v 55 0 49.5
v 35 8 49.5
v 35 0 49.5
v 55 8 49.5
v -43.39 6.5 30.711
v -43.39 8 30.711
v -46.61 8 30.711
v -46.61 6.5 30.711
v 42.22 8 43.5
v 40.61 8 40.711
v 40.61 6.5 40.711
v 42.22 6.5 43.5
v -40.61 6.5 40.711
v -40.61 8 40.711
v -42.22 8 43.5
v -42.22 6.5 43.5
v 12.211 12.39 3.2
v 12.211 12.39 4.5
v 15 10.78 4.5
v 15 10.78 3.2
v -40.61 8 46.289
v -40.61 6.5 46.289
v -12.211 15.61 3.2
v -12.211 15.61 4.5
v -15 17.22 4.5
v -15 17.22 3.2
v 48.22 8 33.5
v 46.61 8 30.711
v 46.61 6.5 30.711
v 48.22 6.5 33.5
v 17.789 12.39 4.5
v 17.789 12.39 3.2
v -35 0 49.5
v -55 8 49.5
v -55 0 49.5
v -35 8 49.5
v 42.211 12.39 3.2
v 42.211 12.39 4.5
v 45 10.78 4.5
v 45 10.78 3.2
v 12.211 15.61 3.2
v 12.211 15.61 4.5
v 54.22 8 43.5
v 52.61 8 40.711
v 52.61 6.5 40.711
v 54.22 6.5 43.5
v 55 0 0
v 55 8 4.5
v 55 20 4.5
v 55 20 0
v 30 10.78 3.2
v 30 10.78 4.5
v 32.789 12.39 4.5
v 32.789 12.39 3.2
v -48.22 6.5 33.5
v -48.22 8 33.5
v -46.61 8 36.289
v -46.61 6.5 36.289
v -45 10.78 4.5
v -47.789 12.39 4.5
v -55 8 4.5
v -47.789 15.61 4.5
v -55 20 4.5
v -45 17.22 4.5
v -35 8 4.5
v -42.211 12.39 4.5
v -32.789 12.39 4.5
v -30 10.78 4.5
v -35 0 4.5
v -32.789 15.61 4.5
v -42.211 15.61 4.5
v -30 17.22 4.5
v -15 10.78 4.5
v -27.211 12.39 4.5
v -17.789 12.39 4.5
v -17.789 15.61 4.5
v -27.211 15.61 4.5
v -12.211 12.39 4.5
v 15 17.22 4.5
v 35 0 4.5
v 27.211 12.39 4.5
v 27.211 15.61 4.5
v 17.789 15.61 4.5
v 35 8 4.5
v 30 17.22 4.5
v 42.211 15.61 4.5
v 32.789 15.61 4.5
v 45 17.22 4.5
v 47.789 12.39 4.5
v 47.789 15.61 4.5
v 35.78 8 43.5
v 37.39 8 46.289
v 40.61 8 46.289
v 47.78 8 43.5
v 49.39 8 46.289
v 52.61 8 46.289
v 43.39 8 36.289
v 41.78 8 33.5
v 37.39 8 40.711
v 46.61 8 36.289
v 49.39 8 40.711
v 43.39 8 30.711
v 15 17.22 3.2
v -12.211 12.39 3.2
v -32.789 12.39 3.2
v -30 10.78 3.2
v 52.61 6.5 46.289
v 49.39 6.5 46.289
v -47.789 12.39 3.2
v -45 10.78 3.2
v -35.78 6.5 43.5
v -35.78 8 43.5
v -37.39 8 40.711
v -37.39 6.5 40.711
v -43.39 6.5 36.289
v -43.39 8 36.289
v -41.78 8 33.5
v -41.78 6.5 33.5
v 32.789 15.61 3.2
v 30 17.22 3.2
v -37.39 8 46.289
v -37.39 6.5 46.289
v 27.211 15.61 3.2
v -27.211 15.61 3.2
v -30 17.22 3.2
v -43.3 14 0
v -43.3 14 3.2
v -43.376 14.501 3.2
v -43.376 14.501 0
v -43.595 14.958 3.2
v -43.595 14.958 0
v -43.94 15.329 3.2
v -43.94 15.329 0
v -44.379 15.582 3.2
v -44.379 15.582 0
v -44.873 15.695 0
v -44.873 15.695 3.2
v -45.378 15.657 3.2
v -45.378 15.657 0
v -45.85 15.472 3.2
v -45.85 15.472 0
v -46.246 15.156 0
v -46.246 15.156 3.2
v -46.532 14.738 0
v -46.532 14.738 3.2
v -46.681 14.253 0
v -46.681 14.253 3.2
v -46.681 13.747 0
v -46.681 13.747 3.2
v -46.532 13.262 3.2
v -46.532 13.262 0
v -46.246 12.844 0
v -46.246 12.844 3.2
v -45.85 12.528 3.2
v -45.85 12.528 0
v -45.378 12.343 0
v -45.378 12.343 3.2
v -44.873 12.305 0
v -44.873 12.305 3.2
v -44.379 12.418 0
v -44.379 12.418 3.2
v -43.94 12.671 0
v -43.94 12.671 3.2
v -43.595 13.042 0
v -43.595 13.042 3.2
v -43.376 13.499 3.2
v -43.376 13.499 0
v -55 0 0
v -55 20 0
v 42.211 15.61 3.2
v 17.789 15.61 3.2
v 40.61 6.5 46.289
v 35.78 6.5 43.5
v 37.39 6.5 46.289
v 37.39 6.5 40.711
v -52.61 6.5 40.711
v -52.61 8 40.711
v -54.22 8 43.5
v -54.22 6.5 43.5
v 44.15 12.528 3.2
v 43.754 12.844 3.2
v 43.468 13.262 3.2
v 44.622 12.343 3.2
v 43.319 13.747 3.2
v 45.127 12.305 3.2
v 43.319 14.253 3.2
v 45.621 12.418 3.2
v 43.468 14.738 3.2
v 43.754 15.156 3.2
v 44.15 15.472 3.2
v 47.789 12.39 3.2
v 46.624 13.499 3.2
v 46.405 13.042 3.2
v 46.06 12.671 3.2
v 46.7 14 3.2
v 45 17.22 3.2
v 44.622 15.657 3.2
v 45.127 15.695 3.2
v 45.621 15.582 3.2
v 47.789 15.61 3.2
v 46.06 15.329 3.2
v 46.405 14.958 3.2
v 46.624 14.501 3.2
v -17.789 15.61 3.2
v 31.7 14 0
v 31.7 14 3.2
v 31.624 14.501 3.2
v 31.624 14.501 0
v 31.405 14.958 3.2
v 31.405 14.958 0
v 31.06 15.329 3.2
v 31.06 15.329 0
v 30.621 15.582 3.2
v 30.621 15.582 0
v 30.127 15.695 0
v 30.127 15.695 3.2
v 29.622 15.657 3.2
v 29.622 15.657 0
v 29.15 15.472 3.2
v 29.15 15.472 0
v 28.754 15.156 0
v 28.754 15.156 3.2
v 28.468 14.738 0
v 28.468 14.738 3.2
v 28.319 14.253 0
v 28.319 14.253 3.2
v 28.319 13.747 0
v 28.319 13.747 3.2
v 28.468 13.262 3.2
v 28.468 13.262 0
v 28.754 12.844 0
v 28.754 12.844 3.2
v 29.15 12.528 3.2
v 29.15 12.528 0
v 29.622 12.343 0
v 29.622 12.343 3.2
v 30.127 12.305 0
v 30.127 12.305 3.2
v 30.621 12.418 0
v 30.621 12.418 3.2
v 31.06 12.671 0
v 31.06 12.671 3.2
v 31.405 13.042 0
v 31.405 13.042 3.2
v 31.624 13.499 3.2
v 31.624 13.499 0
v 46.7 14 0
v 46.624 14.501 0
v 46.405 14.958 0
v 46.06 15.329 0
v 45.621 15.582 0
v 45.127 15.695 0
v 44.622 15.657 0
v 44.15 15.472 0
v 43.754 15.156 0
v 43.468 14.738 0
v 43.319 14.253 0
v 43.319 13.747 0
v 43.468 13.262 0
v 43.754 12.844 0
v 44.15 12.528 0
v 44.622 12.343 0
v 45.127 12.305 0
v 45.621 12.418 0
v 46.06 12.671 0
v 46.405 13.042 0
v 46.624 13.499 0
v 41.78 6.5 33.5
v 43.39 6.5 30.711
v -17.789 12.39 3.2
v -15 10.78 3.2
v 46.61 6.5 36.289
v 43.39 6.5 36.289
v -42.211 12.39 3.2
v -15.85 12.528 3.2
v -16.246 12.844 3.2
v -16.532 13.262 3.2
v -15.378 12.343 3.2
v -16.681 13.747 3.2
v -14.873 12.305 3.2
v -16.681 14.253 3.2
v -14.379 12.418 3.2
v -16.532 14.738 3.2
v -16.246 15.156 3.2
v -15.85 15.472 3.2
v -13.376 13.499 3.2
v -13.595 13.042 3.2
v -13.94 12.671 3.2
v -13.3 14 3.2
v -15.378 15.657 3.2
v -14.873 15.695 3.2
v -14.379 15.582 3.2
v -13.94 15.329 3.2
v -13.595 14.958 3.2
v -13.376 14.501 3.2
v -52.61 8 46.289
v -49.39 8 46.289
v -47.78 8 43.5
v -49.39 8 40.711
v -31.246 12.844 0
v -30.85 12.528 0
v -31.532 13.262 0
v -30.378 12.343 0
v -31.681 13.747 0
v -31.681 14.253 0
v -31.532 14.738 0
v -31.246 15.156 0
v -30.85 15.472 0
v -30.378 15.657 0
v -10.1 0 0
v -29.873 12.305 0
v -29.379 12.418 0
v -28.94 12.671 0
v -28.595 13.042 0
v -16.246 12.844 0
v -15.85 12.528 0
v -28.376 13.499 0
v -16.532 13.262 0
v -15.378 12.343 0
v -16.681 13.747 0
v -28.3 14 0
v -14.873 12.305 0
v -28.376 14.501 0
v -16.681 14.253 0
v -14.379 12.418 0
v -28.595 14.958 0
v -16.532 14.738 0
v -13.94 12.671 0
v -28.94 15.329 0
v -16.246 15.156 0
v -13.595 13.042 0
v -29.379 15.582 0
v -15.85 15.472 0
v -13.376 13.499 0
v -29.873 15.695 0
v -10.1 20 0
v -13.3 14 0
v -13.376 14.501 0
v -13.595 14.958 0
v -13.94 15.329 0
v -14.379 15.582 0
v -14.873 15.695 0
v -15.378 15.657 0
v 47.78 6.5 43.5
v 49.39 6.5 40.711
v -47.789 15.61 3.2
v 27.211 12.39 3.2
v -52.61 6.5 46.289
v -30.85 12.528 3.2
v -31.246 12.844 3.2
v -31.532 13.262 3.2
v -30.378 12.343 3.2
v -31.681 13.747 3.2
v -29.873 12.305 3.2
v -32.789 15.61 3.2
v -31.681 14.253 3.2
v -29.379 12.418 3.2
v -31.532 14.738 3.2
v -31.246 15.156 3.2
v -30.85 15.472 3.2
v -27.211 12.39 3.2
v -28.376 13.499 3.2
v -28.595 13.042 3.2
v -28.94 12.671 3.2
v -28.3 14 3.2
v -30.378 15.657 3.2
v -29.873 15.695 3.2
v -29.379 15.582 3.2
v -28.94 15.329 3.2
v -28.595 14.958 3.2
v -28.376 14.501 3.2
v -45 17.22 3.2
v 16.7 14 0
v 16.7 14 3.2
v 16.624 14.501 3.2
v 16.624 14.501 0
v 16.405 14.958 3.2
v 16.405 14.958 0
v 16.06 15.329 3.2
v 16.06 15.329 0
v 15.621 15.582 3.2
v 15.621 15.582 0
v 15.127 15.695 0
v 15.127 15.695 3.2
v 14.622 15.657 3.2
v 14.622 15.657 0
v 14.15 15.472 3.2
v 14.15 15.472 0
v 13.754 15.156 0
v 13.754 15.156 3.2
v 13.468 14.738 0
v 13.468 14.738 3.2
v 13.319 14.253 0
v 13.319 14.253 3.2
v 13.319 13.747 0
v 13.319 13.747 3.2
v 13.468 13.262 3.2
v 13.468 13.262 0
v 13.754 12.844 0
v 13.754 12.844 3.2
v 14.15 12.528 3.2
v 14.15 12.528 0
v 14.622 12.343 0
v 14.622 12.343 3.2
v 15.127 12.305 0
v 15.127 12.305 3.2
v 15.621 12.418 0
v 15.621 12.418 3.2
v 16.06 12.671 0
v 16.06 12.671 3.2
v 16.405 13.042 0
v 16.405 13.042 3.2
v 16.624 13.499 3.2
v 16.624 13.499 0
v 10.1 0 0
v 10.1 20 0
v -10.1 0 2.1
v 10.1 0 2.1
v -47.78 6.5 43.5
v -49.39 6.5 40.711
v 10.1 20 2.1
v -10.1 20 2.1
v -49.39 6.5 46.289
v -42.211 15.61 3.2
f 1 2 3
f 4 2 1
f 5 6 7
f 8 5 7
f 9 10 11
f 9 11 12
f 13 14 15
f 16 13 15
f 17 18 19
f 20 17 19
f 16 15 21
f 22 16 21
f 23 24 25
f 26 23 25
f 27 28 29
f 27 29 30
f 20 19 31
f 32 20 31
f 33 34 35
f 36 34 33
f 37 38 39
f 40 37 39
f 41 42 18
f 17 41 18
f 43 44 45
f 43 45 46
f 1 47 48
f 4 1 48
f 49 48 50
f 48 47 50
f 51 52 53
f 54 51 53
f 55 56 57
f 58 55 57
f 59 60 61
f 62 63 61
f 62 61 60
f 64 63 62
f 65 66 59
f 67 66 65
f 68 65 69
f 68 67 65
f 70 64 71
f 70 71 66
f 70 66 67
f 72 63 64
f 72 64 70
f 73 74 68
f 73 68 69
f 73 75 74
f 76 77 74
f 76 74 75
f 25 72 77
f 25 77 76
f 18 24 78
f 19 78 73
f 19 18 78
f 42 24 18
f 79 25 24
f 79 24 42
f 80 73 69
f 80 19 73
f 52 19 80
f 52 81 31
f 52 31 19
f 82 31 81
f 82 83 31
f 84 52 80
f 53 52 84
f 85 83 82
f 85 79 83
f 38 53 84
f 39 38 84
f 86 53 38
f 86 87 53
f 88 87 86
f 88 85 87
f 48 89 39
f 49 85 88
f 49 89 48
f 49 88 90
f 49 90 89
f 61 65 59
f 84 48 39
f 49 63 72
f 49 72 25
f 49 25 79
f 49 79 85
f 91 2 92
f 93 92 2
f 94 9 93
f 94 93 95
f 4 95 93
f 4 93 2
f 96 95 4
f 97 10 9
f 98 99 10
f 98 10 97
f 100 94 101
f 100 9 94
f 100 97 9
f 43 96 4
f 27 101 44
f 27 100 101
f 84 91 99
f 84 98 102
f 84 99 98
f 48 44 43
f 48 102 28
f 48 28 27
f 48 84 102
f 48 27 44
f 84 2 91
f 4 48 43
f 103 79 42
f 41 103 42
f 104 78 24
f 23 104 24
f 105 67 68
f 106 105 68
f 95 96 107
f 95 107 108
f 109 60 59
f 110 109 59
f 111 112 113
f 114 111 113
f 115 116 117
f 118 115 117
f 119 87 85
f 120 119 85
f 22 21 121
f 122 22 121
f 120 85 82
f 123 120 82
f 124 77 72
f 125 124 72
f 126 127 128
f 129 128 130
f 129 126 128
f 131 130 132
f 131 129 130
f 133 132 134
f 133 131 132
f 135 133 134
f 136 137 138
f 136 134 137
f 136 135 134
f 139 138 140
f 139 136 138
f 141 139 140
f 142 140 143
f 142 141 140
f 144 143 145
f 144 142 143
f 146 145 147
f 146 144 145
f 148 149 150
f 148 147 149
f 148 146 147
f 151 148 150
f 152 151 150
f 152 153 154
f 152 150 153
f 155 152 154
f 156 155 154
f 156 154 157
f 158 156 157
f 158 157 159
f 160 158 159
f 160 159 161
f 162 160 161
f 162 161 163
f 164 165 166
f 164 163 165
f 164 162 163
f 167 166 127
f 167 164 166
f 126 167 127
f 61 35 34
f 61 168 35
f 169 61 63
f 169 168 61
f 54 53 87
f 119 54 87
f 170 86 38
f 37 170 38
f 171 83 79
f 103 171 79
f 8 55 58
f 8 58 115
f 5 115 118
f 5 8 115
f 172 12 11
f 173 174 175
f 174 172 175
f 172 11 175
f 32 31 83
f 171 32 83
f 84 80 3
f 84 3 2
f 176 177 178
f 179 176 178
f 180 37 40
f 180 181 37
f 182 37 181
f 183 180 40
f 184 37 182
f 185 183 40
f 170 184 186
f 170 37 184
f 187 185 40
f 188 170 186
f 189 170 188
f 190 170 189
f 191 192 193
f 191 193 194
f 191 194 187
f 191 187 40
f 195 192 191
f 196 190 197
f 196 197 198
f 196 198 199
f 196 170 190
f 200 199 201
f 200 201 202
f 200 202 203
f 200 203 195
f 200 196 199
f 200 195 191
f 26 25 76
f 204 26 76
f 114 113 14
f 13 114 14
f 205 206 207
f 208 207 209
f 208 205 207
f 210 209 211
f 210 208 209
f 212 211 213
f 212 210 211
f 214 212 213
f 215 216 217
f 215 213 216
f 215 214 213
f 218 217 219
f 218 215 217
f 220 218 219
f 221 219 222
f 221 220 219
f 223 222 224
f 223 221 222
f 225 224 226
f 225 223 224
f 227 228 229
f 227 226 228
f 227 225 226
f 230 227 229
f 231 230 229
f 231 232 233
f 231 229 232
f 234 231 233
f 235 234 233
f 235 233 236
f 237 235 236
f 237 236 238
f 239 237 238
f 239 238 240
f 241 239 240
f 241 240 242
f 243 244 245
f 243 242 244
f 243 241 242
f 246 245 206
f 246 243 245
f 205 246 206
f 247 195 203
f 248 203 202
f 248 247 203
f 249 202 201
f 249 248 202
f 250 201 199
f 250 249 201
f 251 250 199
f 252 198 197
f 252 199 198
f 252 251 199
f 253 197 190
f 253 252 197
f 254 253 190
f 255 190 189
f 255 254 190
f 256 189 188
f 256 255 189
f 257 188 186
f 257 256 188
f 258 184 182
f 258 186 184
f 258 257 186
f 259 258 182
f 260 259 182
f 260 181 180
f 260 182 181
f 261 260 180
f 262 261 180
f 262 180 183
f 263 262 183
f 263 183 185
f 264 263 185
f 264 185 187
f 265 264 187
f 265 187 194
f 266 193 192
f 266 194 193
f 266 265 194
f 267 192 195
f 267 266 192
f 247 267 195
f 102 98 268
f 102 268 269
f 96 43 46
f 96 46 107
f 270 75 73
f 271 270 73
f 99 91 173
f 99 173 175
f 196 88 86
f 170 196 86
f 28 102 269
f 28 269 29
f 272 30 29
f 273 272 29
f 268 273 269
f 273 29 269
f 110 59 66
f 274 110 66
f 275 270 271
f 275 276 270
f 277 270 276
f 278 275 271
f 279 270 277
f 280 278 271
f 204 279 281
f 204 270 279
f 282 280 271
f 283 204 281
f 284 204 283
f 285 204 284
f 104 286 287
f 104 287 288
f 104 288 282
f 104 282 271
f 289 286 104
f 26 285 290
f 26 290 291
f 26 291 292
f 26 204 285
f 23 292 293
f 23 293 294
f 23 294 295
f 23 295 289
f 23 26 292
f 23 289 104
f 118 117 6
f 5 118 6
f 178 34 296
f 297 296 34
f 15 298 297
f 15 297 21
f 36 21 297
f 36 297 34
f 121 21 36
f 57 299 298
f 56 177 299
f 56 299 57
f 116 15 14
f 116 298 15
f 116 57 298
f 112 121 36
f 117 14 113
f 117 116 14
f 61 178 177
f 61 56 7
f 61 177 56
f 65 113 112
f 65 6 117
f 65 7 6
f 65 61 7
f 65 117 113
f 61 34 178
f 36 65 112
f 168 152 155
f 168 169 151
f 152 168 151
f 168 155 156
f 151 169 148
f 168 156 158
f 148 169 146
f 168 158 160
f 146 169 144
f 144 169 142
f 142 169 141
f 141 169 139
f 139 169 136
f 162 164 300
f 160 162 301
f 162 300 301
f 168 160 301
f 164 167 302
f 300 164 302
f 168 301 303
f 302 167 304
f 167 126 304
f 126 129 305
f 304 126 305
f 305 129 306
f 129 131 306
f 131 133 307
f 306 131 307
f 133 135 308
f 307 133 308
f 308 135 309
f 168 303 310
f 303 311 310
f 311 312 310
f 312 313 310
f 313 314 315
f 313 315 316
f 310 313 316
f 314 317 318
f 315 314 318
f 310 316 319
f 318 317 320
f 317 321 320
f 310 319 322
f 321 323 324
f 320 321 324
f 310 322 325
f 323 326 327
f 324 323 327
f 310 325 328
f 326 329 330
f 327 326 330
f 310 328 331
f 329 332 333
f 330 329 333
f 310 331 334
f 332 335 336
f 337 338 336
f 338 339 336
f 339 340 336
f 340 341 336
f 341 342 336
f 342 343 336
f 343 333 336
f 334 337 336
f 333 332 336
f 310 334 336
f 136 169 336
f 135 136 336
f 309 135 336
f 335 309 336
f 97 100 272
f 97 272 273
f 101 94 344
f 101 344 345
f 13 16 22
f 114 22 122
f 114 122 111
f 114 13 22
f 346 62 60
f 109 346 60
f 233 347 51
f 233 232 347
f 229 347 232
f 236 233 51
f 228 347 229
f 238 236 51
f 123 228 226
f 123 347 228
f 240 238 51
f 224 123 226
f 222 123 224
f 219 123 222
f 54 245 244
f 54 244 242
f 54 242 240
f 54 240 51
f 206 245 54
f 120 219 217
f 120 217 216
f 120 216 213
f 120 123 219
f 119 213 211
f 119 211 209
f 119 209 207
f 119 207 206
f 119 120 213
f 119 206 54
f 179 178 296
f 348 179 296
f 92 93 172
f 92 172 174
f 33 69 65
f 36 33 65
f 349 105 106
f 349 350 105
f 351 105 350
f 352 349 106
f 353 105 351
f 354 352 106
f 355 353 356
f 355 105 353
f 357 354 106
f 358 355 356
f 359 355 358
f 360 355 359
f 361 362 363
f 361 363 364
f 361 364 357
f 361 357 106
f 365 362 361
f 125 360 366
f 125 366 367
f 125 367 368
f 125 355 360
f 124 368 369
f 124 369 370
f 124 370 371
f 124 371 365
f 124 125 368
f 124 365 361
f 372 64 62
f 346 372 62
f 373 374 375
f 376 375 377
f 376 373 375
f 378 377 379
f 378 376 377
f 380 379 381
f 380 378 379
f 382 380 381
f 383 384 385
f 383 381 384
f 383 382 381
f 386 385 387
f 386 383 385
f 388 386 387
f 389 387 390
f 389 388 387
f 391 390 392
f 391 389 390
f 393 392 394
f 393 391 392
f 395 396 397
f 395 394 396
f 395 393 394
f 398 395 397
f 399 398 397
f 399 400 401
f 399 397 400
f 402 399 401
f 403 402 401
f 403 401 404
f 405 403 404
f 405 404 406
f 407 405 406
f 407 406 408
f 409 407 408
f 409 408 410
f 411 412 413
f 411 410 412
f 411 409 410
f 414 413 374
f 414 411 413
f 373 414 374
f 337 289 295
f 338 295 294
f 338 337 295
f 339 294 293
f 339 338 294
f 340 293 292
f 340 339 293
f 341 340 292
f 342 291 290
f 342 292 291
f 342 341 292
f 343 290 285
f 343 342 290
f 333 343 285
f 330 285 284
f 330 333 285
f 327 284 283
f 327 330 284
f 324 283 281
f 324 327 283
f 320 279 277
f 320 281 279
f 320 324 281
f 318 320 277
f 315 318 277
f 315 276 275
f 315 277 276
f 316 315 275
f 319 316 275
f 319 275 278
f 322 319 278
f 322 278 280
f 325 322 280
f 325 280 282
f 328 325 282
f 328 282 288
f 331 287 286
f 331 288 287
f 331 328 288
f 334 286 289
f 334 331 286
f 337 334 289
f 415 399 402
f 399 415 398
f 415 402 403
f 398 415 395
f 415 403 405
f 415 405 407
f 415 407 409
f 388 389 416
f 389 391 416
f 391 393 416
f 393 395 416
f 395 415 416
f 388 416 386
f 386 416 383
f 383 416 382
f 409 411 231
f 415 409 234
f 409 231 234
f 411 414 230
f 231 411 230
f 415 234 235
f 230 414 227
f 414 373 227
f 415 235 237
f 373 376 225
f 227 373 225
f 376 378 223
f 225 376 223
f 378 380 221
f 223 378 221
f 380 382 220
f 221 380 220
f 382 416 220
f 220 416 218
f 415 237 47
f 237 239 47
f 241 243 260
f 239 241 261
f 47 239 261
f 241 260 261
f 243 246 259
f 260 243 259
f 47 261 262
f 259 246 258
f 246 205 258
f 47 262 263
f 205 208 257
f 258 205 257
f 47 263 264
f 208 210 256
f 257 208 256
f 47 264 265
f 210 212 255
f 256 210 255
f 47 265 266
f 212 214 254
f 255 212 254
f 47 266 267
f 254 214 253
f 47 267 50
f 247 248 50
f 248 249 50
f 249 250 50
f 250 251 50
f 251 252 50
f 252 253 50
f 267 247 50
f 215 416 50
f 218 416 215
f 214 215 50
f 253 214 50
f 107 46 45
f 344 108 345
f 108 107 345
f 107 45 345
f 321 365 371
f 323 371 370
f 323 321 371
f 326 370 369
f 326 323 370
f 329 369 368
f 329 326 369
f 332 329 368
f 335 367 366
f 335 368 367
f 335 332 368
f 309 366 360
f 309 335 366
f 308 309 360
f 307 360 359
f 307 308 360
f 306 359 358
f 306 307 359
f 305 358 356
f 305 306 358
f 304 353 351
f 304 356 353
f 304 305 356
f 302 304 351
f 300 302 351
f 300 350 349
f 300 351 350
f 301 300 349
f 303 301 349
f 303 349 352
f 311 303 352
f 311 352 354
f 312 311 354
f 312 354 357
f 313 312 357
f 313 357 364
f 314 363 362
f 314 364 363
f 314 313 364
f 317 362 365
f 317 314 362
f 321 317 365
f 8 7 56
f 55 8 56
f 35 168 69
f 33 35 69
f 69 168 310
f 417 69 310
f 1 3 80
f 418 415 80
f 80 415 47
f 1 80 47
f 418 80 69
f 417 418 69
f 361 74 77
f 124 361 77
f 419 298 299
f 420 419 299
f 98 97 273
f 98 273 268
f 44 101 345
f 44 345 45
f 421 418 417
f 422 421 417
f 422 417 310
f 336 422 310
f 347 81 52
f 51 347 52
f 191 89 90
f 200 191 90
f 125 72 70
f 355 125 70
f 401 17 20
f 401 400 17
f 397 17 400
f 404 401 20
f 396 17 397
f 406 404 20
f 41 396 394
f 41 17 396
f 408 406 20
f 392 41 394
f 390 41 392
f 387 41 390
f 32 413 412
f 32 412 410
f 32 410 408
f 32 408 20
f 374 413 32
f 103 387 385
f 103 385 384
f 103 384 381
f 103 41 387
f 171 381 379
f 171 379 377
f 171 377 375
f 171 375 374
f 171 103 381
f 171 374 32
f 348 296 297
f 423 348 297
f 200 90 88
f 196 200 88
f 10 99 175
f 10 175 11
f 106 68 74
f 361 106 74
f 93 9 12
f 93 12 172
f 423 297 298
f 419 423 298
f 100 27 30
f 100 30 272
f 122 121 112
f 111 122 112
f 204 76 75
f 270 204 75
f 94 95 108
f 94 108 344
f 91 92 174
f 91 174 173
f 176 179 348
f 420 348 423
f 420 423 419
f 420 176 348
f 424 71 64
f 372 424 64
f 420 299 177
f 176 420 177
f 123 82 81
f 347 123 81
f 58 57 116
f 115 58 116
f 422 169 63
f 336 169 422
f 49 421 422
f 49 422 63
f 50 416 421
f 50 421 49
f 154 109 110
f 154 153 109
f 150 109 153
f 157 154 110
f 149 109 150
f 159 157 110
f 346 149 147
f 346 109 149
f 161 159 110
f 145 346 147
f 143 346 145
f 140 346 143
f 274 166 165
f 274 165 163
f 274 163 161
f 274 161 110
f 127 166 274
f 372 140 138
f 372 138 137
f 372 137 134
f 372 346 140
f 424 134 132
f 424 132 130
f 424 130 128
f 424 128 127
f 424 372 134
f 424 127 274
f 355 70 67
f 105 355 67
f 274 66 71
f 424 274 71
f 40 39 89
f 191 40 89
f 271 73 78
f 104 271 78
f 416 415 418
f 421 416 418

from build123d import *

# Parameters (mm, degrees)
SKETCH_1_W          = 110
SKETCH_1_H          = 20
SKETCH_1_R          = 1.7
EXTRUDE_1_DEPTH     = 4.5
SKETCH_2_W          = 20
SKETCH_2_H          = 8
EXTRUDE_2_DEPTH     = 45
CUT_EXTRUDE_1_DEPTH = 1.3
CUT_EXTRUDE_2_DEPTH = 29
SKETCH_11_R         = 1.7
CUT_EXTRUDE_3_DEPTH = 167
CUT_EXTRUDE_4_DEPTH = 1.5


with BuildPart() as part:
    # 草图1 → 凸台-拉伸1 (new body)
    with BuildSketch(Plane.XY):
        with Locations((0, 10)):
            Rectangle(SKETCH_1_W, SKETCH_1_H)
        with Locations((-45, 14)):
            Circle(SKETCH_1_R, mode=Mode.SUBTRACT)
        with Locations((-30, 14)):
            Circle(SKETCH_1_R, mode=Mode.SUBTRACT)
        with Locations((-15, 14)):
            Circle(SKETCH_1_R, mode=Mode.SUBTRACT)
        with Locations((15, 14)):
            Circle(SKETCH_1_R, mode=Mode.SUBTRACT)
        with Locations((30, 14)):
            Circle(SKETCH_1_R, mode=Mode.SUBTRACT)
        with Locations((45, 14)):
            Circle(SKETCH_1_R, mode=Mode.SUBTRACT)
    extrude(amount=EXTRUDE_1_DEPTH)

    # 草图2 → 凸台-拉伸2 (add)
    with BuildSketch(Plane.XY.offset(4.5)):
        with Locations((-45, 4)):
            Rectangle(SKETCH_2_W, SKETCH_2_H)
        with Locations((45, 4)):
            Rectangle(SKETCH_2_W, SKETCH_2_H)
    extrude(amount=EXTRUDE_2_DEPTH)

    # 草图3 → 切除-拉伸1 (cut)
    with BuildSketch(Plane.XY.offset(4.5)):
        Polygon((-45, 17.22), (-47.7886018, 15.61), (-47.7886018, 12.39), (-45, 10.78), (-42.2113982, 12.39), (-42.2113982, 15.61), align=None)
        Polygon((-30, 17.22), (-32.7886018, 15.61), (-32.7886018, 12.39), (-30, 10.78), (-27.2113982, 12.39), (-27.2113982, 15.61), align=None)
        Polygon((-15, 17.22), (-17.7886018, 15.61), (-17.7886018, 12.39), (-15, 10.78), (-12.2113982, 12.39), (-12.2113982, 15.61), align=None)
        Polygon((15, 17.22), (12.2113982, 15.61), (12.2113982, 12.39), (15, 10.78), (17.7886018, 12.39), (17.7886018, 15.61), align=None)
        Polygon((30, 17.22), (27.2113982, 15.61), (27.2113982, 12.39), (30, 10.78), (32.7886018, 12.39), (32.7886018, 15.61), align=None)
        Polygon((45, 17.22), (42.2113982, 15.61), (42.2113982, 12.39), (45, 10.78), (47.7886018, 12.39), (47.7886018, 15.61), align=None)
    extrude(amount=-CUT_EXTRUDE_1_DEPTH, mode=Mode.SUBTRACT)

    # 草图10 → 切除-拉伸2 (cut)
    with BuildSketch(Plane.XZ):
        Polygon((0, 0), (10.1, 0), (10.1, 2.1), (-10.1, 2.1), (-10.1, 0), align=None)
    extrude(amount=-CUT_EXTRUDE_2_DEPTH, mode=Mode.SUBTRACT)

    # 草图11 → 切除-拉伸3 (cut)
    with BuildSketch(Plane.XZ):
        with Locations((-331.768706014, -207.641629986)):
            Circle(SKETCH_11_R)
        with Locations((-337.768706014, -197.641629986)):
            Circle(SKETCH_11_R)
        with Locations((-325.768706014, -197.641629986)):
            Circle(SKETCH_11_R)
        with Locations((-247.768706014, -197.641629986)):
            Circle(SKETCH_11_R)
        with Locations((-235.768706014, -197.641629986)):
            Circle(SKETCH_11_R)
        with Locations((-241.768706014, -207.641629986)):
            Circle(SKETCH_11_R)
    extrude(amount=-CUT_EXTRUDE_3_DEPTH, mode=Mode.SUBTRACT)

    # 草图12 → 切除-拉伸4 (cut)
    with BuildSketch(Plane(origin=(0, 8, 0), x_dir=(1, 0, 0), z_dir=(0, 1, 0))):
        Polygon((-41.78, -33.5), (-43.39, -30.7113982), (-46.61, -30.7113982), (-48.22, -33.5), (-46.61, -36.2886018), (-43.39, -36.2886018), align=None)
        Polygon((-47.78, -43.5), (-49.39, -40.7113982), (-52.61, -40.7113982), (-54.22, -43.5), (-52.61, -46.2886018), (-49.39, -46.2886018), align=None)
        Polygon((-35.78, -43.5), (-37.39, -40.7113982), (-40.61, -40.7113982), (-42.22, -43.5), (-40.61, -46.2886018), (-37.39, -46.2886018), align=None)
        Polygon((37.39, -46.2886018), (35.78, -43.5), (37.39, -40.7113982), (40.61, -40.7113982), (42.22, -43.5), (40.61, -46.2886018), align=None)
        Polygon((49.39, -46.2886018), (47.78, -43.5), (49.39, -40.7113982), (52.61, -40.7113982), (54.22, -43.5), (52.61, -46.2886018), align=None)
        Polygon((43.39, -36.2886018), (41.78, -33.5), (43.39, -30.7113982), (46.61, -30.7113982), (48.22, -33.5), (46.61, -36.2886018), align=None)
    extrude(amount=-CUT_EXTRUDE_4_DEPTH, mode=Mode.SUBTRACT)


solid = part.part
